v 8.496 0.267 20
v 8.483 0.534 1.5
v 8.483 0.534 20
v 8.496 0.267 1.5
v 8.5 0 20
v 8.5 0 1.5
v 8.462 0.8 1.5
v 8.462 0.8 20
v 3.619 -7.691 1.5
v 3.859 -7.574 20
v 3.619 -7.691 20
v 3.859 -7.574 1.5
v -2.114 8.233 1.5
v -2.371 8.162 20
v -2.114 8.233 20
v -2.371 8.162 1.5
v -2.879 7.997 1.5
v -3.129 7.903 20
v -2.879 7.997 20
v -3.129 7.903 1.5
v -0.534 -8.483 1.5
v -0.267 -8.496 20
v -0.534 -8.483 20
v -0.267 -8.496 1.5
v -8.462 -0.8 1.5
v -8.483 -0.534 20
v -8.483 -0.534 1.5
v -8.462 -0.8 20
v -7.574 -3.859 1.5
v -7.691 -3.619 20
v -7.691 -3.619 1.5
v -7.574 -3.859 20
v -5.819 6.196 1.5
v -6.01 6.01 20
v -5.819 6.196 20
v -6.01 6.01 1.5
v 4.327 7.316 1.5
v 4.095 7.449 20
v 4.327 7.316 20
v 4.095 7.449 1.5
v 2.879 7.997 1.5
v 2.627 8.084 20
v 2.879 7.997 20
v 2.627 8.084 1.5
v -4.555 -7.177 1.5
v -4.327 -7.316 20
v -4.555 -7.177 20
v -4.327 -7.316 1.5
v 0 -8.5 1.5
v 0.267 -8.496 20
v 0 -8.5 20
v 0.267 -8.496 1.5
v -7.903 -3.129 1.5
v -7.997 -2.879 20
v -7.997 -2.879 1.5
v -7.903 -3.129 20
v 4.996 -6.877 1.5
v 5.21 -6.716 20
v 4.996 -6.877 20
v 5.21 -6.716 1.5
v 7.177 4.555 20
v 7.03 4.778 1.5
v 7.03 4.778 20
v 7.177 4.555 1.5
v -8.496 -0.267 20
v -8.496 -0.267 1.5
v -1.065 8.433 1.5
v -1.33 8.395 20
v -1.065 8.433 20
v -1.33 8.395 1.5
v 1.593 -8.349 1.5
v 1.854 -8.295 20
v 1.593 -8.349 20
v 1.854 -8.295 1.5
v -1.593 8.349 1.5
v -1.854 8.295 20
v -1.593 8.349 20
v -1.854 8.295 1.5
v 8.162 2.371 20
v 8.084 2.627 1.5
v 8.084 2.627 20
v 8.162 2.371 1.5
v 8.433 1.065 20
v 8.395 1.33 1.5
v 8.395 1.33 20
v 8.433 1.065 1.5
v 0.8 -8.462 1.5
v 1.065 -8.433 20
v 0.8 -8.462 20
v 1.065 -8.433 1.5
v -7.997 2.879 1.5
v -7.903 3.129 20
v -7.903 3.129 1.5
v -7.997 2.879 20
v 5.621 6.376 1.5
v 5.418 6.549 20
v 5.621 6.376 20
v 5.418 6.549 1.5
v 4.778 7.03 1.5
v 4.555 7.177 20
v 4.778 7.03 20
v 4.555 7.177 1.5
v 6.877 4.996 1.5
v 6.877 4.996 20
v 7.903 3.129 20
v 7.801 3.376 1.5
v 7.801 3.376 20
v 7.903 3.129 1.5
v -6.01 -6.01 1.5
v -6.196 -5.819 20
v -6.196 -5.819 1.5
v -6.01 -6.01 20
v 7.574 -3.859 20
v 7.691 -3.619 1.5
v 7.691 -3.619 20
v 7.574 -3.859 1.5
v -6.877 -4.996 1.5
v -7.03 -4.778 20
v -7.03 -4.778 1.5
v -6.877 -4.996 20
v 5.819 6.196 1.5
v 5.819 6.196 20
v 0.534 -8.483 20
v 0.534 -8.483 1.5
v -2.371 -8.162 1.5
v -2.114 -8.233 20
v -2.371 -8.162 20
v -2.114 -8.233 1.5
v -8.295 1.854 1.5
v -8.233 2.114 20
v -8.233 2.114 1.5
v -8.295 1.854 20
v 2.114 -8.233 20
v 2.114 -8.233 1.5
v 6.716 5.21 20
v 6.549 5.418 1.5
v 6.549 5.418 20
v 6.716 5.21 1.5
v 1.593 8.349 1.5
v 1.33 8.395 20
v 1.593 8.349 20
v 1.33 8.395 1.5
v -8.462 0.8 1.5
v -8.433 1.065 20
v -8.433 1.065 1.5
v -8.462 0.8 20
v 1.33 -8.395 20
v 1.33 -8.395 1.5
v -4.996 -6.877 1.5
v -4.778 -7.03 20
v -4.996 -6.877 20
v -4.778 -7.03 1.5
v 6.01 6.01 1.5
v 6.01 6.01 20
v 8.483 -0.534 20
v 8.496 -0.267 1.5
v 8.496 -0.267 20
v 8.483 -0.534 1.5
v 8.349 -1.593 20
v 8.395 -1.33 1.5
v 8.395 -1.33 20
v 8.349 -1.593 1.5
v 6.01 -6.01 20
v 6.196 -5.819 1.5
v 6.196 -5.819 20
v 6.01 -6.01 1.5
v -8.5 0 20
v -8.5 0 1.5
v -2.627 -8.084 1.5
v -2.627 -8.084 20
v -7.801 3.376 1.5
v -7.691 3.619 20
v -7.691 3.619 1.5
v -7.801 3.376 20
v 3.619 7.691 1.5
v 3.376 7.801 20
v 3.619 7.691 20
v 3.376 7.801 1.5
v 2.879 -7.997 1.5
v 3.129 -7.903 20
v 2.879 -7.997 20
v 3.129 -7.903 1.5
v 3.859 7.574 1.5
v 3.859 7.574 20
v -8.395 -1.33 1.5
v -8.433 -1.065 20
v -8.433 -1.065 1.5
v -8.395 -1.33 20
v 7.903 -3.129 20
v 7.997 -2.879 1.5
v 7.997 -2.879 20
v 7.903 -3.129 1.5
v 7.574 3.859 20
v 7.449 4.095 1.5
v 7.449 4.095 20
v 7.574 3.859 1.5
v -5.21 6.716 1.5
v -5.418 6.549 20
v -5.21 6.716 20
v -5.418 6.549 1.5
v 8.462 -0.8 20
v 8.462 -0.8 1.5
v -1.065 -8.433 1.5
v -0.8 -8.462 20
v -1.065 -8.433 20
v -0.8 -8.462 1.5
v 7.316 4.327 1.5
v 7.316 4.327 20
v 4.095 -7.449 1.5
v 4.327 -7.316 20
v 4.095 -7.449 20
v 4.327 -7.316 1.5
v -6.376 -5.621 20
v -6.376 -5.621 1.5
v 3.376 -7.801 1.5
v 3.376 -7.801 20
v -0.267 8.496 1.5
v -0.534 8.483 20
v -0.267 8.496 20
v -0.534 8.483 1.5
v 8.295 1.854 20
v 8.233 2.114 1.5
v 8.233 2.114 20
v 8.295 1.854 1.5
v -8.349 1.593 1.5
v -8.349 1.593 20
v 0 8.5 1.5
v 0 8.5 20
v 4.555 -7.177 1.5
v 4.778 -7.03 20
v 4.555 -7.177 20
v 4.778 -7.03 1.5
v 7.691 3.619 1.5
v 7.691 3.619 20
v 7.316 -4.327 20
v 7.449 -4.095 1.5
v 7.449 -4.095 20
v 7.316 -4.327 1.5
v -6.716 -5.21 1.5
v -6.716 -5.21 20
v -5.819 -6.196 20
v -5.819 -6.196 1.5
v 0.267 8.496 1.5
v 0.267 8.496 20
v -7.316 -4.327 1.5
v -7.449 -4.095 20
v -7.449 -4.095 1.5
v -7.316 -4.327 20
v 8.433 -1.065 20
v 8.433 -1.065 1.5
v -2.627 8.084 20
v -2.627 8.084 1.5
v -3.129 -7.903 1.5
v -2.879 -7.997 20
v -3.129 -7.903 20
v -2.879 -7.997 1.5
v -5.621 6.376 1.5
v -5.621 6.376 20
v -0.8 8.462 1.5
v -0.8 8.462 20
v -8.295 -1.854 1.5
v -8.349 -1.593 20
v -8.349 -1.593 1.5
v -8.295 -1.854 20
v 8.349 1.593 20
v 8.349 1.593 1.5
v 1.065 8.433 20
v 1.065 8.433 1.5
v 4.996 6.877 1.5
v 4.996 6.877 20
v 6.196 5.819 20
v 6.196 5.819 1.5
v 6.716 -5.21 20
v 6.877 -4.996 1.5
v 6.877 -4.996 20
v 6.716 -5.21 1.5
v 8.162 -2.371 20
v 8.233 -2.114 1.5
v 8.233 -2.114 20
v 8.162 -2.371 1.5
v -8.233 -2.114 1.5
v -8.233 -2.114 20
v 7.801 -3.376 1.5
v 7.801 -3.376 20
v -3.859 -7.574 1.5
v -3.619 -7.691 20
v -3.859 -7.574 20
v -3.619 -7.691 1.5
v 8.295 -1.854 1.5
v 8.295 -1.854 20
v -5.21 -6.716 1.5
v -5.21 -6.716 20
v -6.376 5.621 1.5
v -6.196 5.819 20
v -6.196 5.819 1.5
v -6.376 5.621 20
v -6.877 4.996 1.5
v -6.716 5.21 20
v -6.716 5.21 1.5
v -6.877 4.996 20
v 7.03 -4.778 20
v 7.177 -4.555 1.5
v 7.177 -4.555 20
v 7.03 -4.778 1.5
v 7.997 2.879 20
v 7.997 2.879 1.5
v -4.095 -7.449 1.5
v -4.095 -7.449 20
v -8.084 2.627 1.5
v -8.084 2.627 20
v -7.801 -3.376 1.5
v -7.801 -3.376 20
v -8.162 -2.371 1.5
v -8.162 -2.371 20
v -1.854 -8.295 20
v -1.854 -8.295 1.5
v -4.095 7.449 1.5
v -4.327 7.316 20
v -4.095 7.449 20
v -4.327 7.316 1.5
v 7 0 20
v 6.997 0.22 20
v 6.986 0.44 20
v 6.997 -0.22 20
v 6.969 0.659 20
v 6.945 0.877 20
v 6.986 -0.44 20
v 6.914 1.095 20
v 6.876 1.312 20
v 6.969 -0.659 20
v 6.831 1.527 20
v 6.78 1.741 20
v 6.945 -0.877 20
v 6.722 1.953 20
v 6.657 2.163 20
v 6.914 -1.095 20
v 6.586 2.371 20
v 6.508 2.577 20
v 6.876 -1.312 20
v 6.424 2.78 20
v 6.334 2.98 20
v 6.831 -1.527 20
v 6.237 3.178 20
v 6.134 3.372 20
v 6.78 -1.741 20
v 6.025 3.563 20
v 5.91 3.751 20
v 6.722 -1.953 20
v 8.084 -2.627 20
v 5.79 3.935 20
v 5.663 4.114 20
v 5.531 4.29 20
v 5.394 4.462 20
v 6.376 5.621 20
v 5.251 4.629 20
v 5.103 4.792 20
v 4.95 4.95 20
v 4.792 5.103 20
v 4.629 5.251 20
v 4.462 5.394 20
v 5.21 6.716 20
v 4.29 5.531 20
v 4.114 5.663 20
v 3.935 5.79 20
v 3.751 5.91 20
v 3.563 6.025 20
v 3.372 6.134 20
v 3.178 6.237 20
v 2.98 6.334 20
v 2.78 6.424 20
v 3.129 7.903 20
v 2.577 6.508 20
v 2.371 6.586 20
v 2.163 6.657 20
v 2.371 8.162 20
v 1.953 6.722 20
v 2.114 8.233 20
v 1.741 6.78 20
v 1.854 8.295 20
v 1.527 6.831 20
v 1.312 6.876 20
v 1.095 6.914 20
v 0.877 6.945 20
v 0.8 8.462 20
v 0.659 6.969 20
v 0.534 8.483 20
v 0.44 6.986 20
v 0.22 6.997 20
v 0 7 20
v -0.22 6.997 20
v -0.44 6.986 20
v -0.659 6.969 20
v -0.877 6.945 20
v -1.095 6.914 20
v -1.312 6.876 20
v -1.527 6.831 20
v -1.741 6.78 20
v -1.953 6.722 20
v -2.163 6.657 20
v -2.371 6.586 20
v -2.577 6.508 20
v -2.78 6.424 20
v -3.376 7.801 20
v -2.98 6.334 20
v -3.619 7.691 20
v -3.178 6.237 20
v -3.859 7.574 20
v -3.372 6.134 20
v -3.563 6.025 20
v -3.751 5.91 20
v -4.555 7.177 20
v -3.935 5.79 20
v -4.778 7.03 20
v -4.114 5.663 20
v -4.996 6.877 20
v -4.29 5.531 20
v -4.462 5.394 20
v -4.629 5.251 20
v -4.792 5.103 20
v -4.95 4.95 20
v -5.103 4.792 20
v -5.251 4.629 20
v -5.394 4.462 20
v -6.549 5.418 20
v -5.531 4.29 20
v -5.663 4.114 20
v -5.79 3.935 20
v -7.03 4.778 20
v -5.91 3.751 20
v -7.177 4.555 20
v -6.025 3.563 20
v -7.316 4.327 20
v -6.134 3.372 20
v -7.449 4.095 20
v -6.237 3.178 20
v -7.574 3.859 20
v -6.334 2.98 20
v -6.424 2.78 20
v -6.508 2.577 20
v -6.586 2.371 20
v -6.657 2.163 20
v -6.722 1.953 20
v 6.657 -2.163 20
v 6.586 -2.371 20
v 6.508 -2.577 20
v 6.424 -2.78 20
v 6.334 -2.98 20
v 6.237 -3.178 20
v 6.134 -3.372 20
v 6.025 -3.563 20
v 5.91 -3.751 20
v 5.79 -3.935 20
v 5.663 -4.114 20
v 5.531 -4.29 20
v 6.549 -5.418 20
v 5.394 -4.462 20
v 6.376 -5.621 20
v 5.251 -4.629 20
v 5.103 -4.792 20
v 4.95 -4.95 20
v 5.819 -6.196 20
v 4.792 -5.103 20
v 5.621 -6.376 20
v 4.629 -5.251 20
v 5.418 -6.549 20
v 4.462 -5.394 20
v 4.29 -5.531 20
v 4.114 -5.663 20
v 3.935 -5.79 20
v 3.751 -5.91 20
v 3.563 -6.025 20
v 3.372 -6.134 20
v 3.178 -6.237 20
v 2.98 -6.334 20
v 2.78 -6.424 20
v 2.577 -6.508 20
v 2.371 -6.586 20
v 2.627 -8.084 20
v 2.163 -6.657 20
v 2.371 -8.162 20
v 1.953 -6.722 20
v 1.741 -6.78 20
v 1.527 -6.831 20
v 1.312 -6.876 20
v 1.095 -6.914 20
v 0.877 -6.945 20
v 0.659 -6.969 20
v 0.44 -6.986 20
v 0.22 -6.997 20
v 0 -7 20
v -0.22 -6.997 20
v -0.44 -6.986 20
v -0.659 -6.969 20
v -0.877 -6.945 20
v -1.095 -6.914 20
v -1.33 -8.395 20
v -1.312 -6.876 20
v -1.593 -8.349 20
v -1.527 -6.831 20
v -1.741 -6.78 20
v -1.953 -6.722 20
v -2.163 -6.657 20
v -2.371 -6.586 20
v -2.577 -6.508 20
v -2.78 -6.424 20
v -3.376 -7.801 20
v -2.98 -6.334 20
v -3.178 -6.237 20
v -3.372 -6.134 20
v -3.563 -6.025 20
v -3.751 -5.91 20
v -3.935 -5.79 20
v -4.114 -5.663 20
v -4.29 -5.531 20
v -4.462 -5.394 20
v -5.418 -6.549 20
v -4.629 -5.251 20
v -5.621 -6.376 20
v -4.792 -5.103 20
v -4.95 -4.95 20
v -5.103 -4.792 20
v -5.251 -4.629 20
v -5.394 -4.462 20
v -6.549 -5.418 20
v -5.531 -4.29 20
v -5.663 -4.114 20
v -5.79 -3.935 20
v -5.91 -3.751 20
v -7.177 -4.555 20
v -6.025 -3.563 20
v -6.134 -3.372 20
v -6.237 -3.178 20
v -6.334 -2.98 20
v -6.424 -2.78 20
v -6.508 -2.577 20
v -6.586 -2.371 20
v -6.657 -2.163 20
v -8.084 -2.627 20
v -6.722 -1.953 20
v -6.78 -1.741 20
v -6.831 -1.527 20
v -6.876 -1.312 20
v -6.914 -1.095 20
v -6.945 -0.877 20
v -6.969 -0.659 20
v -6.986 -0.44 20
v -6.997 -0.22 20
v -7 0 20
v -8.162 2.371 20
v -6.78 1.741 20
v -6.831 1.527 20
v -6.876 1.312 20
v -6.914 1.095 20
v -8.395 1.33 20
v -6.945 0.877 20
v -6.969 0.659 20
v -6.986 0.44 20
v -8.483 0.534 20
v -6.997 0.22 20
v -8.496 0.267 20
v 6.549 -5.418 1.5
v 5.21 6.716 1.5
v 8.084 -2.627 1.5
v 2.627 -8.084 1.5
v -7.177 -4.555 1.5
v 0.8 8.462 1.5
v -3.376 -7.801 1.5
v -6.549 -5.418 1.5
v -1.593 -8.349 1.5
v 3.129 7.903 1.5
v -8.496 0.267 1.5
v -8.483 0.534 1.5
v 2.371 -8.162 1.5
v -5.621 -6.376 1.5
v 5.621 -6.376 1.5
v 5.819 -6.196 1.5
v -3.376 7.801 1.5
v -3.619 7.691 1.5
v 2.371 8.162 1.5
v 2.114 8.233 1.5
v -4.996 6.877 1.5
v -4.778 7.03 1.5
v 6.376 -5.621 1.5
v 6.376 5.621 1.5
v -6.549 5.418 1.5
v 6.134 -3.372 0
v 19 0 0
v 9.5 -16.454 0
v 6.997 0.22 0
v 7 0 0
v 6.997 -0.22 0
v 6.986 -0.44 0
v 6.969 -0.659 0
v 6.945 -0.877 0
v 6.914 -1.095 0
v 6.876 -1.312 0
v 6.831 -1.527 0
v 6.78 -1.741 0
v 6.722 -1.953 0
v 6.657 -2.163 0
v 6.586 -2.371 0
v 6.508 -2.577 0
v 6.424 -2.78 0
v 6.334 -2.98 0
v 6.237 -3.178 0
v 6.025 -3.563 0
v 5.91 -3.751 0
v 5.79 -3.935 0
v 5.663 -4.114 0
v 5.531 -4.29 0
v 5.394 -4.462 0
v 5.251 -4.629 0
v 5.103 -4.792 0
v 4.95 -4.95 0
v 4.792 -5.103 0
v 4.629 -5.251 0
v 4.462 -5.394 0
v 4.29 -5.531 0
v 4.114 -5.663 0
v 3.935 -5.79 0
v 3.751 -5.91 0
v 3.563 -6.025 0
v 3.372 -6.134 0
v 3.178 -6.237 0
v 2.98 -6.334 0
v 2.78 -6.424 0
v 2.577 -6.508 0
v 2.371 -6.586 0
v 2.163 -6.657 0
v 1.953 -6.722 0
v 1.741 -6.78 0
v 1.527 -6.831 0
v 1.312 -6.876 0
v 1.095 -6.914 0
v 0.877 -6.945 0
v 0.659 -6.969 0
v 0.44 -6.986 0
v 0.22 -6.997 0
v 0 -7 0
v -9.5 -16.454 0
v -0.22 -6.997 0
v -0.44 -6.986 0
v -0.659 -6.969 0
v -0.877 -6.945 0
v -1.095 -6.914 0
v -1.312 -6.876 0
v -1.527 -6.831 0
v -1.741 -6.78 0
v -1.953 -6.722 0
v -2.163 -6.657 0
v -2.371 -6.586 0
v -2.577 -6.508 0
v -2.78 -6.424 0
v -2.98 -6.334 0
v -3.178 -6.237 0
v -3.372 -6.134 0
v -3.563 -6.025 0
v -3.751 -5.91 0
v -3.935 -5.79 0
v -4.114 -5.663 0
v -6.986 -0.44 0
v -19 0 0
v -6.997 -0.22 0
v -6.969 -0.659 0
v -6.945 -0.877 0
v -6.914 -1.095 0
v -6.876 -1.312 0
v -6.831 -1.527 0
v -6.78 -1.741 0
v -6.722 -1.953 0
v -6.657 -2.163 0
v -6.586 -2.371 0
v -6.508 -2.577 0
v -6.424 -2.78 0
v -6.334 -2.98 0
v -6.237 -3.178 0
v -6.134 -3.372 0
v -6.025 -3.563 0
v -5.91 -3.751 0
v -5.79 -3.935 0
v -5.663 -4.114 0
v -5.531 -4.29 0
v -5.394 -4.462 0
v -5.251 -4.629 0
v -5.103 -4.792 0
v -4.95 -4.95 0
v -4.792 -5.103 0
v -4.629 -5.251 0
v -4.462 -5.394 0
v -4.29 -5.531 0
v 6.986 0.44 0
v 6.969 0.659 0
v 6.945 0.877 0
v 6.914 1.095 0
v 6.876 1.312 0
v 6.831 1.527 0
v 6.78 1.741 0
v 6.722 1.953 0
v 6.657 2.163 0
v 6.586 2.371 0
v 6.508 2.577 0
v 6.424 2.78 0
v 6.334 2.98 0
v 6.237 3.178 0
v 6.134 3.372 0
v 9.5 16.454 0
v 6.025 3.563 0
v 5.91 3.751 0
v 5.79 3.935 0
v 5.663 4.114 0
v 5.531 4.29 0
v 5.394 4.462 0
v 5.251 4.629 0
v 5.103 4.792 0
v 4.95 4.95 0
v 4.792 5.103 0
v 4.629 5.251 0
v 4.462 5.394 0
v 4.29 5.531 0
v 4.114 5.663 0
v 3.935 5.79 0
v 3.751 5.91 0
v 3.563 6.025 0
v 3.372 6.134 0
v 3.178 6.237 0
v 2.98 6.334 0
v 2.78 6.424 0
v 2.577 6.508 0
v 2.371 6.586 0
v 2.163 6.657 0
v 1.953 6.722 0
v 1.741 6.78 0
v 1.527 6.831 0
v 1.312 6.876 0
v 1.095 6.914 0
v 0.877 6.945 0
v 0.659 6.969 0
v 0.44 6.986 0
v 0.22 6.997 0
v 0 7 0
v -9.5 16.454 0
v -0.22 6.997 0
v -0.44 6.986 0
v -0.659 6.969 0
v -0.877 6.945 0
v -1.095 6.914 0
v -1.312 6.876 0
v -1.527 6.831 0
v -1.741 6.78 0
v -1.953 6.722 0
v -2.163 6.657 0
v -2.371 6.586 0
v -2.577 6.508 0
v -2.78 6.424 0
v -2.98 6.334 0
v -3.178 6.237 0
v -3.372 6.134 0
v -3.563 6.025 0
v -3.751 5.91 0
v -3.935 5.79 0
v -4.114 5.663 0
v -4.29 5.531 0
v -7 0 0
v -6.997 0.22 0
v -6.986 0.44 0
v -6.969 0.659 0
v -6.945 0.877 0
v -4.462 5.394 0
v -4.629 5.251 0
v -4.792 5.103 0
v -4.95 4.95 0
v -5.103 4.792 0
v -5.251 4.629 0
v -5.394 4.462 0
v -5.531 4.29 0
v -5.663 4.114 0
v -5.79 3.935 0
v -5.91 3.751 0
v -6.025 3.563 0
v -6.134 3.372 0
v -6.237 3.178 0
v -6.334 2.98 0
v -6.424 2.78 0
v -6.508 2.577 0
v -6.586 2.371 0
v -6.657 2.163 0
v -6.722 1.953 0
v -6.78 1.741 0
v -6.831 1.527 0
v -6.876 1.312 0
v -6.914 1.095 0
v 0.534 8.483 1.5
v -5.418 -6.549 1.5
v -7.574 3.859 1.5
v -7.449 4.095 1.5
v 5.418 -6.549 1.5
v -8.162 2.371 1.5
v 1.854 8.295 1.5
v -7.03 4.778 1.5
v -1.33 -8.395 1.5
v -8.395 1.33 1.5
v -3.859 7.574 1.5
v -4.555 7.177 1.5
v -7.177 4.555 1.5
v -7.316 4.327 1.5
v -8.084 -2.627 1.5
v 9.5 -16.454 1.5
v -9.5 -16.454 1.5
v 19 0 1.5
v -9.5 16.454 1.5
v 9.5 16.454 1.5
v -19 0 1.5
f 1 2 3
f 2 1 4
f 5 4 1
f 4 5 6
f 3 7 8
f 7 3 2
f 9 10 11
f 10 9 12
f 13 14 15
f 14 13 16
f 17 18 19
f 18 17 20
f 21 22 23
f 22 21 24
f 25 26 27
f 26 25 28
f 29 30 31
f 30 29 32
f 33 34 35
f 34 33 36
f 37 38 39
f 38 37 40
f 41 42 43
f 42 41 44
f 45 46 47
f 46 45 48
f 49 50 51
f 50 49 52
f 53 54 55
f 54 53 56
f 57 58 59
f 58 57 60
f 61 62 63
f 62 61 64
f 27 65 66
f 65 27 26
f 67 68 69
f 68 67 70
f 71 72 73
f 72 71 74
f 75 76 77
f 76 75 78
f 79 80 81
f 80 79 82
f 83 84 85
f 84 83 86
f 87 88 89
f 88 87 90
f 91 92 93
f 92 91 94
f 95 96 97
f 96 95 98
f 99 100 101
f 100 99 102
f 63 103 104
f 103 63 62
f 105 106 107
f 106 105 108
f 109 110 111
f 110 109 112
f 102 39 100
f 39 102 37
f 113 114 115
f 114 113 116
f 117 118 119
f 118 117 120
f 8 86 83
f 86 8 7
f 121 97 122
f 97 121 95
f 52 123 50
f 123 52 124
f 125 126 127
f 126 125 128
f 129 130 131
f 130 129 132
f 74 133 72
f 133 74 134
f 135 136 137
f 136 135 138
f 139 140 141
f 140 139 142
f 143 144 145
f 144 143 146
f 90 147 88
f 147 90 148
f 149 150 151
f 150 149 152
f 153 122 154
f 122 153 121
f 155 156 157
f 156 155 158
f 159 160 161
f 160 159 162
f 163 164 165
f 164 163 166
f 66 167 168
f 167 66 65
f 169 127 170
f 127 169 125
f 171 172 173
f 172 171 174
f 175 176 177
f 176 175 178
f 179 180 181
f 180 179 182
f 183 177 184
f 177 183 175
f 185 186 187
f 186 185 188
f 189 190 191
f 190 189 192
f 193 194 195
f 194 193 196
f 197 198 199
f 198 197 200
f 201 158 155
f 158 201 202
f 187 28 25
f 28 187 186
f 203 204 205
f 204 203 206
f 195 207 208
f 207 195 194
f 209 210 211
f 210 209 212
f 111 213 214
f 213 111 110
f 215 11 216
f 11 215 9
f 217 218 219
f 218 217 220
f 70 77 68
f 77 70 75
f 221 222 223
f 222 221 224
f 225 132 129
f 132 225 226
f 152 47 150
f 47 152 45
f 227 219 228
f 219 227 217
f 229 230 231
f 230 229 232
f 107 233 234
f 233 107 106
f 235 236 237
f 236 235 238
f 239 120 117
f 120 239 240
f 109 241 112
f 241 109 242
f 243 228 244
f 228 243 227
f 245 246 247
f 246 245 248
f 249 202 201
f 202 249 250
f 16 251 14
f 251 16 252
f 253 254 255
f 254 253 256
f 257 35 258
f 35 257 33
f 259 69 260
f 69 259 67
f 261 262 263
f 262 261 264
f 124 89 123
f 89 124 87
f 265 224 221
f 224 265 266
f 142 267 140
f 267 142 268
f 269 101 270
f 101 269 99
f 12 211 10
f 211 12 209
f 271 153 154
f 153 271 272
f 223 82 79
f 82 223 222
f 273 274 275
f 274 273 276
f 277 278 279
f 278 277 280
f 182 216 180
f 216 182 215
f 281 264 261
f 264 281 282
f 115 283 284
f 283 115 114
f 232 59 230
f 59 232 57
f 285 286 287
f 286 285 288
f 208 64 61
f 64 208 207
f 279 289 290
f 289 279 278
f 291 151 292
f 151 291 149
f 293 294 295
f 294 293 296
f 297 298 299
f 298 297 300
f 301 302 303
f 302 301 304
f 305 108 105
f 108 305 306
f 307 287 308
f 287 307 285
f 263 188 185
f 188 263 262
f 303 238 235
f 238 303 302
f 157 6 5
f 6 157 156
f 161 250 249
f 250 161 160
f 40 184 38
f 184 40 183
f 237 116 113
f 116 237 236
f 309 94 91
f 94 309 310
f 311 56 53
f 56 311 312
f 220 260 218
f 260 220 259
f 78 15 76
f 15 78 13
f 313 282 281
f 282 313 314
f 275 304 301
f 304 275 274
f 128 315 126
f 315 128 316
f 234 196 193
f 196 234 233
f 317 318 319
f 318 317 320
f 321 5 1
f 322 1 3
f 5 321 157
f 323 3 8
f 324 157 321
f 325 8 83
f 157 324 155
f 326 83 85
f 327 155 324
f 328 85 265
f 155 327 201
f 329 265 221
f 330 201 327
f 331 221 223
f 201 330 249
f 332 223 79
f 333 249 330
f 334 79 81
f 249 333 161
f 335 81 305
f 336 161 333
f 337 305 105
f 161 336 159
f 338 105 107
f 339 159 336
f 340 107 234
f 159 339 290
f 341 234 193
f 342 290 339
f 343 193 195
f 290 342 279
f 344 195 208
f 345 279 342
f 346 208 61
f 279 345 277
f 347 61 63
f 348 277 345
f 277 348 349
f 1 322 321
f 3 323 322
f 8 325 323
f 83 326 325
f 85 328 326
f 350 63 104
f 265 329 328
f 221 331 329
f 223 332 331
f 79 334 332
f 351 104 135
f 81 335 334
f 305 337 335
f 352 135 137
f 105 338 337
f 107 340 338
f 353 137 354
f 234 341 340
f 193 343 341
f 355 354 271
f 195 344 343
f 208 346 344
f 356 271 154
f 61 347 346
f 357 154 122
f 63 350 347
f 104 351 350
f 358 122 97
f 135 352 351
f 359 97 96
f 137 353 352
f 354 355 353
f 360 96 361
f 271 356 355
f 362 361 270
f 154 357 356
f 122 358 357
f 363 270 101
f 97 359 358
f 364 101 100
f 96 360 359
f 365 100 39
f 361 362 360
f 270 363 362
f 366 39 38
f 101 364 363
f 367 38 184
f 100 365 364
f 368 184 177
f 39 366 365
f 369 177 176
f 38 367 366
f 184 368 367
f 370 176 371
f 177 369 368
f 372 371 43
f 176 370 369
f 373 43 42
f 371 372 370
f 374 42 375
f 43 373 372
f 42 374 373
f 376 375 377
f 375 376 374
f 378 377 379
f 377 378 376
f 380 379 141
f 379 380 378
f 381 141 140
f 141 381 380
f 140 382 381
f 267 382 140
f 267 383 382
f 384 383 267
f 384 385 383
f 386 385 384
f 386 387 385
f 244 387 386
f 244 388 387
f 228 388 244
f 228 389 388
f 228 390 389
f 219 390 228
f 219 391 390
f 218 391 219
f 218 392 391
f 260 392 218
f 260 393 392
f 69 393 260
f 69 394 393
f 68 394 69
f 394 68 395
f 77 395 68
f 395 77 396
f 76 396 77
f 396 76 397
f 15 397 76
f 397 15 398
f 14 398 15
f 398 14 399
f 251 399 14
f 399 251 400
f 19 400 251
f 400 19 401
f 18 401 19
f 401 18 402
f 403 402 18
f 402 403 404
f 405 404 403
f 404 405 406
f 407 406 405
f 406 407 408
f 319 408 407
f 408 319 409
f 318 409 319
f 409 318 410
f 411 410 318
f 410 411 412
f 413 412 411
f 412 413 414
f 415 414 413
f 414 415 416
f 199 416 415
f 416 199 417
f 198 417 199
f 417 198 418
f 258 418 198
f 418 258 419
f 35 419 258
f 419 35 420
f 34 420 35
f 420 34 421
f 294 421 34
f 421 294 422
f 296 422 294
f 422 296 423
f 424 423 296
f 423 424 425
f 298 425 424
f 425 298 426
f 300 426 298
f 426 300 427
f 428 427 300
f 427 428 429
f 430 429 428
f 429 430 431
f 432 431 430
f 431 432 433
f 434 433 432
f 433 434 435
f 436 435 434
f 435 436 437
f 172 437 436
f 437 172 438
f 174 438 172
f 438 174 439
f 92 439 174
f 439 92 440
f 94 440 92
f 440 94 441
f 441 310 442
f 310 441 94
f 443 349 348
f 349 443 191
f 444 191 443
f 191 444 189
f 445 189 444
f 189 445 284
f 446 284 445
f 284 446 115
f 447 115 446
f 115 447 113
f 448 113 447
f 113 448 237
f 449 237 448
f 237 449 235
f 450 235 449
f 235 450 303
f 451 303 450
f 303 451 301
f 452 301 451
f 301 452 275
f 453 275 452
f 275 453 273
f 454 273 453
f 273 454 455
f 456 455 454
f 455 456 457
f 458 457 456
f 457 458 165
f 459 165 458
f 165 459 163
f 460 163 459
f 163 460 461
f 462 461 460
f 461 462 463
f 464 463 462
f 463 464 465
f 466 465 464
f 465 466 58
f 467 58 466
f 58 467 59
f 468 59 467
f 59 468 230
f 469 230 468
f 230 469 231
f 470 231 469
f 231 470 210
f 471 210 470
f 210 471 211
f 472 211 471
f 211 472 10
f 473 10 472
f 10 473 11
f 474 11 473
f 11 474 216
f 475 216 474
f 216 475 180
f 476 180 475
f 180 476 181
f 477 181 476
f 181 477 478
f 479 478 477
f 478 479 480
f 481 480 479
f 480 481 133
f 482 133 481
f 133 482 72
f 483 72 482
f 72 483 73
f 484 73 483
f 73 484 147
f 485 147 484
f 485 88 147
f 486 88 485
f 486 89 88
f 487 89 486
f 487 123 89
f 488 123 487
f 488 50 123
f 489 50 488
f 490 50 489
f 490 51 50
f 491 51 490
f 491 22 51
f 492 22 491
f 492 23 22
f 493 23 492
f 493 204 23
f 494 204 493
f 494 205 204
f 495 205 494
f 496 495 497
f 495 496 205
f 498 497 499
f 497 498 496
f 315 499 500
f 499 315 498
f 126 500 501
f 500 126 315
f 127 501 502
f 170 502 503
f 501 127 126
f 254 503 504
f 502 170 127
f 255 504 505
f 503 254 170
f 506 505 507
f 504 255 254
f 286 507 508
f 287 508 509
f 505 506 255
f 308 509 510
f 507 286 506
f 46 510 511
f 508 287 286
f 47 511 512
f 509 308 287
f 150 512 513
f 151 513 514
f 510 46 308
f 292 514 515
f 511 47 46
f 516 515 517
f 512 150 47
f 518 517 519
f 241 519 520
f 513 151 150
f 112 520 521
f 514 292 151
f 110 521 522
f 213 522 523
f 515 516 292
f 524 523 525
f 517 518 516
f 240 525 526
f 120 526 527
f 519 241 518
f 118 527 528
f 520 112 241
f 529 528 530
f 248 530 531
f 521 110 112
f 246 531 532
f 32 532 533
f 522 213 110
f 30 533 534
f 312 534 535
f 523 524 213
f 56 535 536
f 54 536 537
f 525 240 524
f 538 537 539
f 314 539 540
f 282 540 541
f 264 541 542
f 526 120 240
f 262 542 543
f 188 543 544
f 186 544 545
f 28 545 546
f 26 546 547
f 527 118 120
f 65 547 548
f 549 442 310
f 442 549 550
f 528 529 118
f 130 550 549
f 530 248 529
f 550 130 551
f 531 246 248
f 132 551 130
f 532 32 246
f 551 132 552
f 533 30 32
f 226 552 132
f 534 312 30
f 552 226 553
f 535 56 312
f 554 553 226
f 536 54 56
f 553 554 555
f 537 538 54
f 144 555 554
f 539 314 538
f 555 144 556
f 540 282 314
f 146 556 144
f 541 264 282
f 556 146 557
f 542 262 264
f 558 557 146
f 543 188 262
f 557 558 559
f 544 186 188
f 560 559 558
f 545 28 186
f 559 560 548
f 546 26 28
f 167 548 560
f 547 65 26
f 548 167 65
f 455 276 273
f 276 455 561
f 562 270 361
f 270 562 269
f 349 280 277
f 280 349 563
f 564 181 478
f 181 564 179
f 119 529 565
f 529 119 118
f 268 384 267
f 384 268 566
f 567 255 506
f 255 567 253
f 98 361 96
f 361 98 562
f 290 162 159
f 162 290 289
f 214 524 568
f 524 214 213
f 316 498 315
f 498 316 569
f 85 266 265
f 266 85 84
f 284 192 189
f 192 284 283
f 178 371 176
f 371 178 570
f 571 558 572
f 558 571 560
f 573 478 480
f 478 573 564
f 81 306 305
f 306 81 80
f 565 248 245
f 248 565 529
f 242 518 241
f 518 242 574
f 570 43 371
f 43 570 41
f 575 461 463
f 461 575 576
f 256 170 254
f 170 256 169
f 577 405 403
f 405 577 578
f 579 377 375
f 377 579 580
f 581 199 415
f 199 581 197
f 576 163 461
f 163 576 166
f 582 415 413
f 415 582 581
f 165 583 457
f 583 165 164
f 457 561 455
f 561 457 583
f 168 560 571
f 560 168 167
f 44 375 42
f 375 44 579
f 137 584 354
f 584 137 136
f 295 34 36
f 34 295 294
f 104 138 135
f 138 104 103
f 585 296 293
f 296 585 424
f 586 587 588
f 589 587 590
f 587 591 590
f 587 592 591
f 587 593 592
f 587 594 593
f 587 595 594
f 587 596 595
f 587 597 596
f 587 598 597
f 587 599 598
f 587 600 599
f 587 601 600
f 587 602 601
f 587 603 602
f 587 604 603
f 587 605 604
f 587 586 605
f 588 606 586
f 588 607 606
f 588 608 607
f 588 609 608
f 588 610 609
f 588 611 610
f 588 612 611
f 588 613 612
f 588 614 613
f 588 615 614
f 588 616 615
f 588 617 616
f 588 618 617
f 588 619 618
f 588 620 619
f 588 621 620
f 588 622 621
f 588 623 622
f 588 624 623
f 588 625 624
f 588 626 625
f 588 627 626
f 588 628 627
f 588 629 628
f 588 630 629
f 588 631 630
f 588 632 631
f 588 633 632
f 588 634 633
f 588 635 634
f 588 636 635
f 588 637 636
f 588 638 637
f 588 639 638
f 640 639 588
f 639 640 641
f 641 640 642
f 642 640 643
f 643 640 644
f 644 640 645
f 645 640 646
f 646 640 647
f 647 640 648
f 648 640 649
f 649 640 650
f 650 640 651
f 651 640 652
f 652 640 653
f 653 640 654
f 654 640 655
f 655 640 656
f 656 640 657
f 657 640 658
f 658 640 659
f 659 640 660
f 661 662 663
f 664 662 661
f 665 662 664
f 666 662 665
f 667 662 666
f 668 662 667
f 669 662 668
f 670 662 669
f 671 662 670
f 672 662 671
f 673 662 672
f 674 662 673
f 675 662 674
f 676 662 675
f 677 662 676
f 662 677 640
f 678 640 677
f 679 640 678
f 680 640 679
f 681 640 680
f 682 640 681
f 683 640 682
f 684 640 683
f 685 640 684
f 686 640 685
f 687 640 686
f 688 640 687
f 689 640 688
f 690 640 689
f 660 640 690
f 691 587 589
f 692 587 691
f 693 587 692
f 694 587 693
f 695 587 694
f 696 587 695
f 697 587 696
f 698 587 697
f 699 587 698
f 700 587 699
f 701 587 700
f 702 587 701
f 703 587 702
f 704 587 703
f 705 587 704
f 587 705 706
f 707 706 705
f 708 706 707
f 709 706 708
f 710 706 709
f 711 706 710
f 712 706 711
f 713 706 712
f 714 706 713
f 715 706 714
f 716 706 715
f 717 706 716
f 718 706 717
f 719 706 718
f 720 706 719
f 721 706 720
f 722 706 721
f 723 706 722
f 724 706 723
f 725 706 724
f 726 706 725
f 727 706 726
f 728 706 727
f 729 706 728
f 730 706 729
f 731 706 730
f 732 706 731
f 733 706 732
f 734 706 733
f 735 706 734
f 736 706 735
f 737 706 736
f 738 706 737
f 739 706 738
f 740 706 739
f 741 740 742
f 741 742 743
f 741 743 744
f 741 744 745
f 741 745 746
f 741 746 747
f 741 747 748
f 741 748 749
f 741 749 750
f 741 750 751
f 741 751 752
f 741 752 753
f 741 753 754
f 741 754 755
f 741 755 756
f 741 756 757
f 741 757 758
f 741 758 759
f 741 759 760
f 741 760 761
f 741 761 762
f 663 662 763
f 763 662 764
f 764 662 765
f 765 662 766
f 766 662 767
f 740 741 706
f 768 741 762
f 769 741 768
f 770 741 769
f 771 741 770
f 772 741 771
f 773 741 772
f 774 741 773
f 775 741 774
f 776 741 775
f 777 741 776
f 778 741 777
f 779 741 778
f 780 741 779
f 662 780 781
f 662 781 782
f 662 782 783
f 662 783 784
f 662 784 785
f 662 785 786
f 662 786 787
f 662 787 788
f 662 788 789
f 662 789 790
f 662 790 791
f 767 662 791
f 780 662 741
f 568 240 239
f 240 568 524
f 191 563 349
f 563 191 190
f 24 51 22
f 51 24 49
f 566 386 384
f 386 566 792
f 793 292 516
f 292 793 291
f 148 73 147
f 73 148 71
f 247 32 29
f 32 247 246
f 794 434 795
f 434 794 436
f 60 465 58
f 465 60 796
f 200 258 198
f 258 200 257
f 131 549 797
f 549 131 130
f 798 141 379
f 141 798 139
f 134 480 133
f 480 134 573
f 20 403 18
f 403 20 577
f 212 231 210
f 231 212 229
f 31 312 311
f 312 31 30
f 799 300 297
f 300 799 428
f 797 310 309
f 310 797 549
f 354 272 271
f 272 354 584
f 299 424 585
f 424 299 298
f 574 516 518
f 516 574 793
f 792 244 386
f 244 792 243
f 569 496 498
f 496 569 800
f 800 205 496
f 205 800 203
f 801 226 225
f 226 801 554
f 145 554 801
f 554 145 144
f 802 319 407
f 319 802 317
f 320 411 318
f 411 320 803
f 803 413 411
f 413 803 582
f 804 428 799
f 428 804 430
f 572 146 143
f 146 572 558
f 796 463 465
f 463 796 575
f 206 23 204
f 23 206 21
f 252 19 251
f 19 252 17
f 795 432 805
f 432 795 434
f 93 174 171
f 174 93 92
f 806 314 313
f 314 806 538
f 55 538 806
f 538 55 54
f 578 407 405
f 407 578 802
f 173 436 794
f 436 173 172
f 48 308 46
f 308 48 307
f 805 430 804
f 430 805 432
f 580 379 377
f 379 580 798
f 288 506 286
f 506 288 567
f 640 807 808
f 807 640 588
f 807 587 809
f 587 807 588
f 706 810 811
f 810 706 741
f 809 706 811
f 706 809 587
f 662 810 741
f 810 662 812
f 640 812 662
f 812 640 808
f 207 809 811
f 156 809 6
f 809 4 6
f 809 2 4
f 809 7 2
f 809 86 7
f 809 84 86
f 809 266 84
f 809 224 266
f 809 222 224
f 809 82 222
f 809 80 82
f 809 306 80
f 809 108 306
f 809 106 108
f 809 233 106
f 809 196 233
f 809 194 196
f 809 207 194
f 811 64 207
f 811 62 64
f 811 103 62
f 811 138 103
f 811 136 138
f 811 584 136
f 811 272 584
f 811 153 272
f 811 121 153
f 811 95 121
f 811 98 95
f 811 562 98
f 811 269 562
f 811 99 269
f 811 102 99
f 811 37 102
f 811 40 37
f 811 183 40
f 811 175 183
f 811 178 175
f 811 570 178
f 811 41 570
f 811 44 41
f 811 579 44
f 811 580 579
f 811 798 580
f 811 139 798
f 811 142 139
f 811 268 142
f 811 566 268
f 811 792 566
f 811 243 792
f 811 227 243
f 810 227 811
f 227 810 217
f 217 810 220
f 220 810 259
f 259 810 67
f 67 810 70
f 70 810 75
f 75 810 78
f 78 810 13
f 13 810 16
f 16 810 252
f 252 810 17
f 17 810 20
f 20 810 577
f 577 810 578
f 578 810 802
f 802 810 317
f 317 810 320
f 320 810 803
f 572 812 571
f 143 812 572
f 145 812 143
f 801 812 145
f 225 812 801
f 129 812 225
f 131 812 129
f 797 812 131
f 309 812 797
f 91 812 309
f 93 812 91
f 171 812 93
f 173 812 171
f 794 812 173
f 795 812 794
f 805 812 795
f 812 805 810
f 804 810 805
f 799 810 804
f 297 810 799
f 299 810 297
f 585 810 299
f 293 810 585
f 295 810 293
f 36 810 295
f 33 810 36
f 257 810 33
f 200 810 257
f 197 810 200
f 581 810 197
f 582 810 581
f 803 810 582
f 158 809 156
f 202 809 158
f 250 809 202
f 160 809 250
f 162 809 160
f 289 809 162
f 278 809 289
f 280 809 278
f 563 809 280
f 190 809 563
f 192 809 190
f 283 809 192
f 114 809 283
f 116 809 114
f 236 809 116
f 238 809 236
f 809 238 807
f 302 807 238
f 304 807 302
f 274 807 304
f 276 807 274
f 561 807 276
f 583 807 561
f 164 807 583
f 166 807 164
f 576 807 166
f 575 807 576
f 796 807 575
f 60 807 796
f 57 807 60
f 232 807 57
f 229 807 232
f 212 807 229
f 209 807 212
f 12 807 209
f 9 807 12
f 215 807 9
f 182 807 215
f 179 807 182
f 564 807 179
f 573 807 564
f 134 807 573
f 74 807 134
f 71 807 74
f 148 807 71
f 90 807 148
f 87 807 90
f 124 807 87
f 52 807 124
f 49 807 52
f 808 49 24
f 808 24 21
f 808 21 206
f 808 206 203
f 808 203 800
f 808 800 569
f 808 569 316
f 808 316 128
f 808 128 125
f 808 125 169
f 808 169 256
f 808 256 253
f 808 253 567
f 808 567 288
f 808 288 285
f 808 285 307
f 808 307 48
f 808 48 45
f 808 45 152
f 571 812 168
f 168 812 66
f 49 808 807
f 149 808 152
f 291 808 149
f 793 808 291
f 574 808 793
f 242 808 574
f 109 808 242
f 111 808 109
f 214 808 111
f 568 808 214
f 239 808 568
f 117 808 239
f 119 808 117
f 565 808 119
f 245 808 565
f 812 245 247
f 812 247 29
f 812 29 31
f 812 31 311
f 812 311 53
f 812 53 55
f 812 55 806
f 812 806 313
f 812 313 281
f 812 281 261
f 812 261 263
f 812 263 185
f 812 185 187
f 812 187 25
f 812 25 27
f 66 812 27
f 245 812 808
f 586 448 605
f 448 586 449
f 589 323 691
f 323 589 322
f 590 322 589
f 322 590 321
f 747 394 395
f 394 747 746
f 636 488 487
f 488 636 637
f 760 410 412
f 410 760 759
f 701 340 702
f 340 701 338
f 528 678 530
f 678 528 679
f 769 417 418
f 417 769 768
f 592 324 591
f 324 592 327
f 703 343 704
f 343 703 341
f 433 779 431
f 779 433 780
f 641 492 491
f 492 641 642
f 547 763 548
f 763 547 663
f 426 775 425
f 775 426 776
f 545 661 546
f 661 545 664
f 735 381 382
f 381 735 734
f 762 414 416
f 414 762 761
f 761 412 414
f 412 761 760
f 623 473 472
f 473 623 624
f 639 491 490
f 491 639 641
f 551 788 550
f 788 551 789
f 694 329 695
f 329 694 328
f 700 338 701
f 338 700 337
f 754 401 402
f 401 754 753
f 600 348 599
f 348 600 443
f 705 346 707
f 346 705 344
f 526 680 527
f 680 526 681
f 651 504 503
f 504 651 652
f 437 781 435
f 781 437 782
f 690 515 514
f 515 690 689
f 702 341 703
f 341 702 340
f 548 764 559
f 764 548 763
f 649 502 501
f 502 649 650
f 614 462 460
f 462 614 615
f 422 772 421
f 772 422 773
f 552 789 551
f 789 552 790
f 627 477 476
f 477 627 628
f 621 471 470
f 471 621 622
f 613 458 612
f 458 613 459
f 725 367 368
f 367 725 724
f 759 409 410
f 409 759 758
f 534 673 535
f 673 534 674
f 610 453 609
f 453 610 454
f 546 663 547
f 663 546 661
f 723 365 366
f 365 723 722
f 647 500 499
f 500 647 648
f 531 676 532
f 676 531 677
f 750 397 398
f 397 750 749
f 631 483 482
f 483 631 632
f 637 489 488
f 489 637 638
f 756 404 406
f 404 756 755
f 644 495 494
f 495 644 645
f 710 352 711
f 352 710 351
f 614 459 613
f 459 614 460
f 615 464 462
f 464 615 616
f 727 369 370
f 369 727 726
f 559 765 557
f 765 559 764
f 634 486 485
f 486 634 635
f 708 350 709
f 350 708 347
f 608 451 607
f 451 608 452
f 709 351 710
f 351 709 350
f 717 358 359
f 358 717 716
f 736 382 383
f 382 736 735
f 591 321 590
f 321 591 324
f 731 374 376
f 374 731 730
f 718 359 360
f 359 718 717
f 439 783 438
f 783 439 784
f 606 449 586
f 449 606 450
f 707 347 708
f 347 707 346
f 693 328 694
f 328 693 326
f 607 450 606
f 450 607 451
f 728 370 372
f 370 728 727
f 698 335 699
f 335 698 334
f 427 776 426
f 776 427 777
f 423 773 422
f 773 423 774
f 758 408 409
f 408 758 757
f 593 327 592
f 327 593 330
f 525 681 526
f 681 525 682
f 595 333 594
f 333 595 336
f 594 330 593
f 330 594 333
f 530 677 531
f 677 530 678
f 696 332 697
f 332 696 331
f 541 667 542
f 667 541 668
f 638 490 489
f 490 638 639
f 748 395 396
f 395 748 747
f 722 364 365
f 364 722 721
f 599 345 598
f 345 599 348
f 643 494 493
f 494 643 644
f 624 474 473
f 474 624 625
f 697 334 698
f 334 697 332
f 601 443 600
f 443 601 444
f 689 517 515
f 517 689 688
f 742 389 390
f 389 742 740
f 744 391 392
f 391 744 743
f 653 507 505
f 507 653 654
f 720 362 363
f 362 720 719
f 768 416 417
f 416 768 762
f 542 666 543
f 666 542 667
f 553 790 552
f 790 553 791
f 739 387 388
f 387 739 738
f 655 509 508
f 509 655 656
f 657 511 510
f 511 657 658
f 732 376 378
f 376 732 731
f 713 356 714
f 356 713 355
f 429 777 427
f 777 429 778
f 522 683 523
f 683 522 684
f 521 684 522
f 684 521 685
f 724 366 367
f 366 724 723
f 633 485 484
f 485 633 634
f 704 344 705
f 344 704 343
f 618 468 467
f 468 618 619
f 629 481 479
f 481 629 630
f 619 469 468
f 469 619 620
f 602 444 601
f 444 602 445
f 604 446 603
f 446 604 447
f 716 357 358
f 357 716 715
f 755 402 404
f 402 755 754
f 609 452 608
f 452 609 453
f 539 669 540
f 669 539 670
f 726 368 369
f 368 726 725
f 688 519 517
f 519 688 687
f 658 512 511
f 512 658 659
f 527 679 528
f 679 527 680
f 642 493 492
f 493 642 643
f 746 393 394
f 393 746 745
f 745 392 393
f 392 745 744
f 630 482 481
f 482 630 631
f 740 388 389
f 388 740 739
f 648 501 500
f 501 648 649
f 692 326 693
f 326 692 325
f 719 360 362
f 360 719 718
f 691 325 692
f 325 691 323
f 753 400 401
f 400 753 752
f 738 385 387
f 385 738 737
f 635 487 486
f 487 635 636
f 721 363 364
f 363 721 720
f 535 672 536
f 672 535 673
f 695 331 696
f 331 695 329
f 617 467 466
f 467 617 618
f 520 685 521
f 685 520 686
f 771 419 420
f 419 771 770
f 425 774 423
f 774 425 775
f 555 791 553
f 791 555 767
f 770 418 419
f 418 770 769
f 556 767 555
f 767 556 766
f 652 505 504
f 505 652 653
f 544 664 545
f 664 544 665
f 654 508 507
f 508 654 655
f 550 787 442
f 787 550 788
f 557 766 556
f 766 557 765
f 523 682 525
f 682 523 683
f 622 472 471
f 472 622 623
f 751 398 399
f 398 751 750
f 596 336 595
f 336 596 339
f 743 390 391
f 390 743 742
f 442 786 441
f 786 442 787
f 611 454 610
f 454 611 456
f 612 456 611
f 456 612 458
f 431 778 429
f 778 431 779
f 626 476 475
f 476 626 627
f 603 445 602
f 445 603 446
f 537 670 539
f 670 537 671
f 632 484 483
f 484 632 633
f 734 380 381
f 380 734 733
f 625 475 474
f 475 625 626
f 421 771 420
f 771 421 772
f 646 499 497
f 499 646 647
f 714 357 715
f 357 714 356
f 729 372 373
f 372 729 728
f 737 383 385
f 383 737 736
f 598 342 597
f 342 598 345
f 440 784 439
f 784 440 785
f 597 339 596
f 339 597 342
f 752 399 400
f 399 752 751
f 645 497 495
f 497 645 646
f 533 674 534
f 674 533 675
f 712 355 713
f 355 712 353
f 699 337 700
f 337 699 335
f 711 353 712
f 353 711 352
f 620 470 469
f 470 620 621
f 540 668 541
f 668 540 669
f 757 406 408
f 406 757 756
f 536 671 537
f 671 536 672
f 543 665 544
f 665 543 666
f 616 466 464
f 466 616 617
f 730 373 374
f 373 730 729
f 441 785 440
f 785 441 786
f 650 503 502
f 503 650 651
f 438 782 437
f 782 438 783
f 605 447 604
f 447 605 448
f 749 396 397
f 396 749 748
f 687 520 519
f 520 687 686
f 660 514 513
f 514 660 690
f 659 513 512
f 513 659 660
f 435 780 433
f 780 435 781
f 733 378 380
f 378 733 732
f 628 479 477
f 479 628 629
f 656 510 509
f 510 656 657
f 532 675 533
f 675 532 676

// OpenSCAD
// measurements in mm

brush_length=12; //12
brush_handle_diam=14;
thickness=1.5;
holder_height=20;
smoothness=200;

foot_diam=(brush_handle_diam/2 + brush_length)*2;

$fn=smoothness;


difference(){
    union(){
        cylinder(h=holder_height, d=brush_handle_diam+2*thickness);
        cylinder(h=thickness, d=foot_diam, $fn=6);
    }
    
    translate([0,0,-1]){
        cylinder(h=holder_height*2, d=brush_handle_diam);
    }
}
